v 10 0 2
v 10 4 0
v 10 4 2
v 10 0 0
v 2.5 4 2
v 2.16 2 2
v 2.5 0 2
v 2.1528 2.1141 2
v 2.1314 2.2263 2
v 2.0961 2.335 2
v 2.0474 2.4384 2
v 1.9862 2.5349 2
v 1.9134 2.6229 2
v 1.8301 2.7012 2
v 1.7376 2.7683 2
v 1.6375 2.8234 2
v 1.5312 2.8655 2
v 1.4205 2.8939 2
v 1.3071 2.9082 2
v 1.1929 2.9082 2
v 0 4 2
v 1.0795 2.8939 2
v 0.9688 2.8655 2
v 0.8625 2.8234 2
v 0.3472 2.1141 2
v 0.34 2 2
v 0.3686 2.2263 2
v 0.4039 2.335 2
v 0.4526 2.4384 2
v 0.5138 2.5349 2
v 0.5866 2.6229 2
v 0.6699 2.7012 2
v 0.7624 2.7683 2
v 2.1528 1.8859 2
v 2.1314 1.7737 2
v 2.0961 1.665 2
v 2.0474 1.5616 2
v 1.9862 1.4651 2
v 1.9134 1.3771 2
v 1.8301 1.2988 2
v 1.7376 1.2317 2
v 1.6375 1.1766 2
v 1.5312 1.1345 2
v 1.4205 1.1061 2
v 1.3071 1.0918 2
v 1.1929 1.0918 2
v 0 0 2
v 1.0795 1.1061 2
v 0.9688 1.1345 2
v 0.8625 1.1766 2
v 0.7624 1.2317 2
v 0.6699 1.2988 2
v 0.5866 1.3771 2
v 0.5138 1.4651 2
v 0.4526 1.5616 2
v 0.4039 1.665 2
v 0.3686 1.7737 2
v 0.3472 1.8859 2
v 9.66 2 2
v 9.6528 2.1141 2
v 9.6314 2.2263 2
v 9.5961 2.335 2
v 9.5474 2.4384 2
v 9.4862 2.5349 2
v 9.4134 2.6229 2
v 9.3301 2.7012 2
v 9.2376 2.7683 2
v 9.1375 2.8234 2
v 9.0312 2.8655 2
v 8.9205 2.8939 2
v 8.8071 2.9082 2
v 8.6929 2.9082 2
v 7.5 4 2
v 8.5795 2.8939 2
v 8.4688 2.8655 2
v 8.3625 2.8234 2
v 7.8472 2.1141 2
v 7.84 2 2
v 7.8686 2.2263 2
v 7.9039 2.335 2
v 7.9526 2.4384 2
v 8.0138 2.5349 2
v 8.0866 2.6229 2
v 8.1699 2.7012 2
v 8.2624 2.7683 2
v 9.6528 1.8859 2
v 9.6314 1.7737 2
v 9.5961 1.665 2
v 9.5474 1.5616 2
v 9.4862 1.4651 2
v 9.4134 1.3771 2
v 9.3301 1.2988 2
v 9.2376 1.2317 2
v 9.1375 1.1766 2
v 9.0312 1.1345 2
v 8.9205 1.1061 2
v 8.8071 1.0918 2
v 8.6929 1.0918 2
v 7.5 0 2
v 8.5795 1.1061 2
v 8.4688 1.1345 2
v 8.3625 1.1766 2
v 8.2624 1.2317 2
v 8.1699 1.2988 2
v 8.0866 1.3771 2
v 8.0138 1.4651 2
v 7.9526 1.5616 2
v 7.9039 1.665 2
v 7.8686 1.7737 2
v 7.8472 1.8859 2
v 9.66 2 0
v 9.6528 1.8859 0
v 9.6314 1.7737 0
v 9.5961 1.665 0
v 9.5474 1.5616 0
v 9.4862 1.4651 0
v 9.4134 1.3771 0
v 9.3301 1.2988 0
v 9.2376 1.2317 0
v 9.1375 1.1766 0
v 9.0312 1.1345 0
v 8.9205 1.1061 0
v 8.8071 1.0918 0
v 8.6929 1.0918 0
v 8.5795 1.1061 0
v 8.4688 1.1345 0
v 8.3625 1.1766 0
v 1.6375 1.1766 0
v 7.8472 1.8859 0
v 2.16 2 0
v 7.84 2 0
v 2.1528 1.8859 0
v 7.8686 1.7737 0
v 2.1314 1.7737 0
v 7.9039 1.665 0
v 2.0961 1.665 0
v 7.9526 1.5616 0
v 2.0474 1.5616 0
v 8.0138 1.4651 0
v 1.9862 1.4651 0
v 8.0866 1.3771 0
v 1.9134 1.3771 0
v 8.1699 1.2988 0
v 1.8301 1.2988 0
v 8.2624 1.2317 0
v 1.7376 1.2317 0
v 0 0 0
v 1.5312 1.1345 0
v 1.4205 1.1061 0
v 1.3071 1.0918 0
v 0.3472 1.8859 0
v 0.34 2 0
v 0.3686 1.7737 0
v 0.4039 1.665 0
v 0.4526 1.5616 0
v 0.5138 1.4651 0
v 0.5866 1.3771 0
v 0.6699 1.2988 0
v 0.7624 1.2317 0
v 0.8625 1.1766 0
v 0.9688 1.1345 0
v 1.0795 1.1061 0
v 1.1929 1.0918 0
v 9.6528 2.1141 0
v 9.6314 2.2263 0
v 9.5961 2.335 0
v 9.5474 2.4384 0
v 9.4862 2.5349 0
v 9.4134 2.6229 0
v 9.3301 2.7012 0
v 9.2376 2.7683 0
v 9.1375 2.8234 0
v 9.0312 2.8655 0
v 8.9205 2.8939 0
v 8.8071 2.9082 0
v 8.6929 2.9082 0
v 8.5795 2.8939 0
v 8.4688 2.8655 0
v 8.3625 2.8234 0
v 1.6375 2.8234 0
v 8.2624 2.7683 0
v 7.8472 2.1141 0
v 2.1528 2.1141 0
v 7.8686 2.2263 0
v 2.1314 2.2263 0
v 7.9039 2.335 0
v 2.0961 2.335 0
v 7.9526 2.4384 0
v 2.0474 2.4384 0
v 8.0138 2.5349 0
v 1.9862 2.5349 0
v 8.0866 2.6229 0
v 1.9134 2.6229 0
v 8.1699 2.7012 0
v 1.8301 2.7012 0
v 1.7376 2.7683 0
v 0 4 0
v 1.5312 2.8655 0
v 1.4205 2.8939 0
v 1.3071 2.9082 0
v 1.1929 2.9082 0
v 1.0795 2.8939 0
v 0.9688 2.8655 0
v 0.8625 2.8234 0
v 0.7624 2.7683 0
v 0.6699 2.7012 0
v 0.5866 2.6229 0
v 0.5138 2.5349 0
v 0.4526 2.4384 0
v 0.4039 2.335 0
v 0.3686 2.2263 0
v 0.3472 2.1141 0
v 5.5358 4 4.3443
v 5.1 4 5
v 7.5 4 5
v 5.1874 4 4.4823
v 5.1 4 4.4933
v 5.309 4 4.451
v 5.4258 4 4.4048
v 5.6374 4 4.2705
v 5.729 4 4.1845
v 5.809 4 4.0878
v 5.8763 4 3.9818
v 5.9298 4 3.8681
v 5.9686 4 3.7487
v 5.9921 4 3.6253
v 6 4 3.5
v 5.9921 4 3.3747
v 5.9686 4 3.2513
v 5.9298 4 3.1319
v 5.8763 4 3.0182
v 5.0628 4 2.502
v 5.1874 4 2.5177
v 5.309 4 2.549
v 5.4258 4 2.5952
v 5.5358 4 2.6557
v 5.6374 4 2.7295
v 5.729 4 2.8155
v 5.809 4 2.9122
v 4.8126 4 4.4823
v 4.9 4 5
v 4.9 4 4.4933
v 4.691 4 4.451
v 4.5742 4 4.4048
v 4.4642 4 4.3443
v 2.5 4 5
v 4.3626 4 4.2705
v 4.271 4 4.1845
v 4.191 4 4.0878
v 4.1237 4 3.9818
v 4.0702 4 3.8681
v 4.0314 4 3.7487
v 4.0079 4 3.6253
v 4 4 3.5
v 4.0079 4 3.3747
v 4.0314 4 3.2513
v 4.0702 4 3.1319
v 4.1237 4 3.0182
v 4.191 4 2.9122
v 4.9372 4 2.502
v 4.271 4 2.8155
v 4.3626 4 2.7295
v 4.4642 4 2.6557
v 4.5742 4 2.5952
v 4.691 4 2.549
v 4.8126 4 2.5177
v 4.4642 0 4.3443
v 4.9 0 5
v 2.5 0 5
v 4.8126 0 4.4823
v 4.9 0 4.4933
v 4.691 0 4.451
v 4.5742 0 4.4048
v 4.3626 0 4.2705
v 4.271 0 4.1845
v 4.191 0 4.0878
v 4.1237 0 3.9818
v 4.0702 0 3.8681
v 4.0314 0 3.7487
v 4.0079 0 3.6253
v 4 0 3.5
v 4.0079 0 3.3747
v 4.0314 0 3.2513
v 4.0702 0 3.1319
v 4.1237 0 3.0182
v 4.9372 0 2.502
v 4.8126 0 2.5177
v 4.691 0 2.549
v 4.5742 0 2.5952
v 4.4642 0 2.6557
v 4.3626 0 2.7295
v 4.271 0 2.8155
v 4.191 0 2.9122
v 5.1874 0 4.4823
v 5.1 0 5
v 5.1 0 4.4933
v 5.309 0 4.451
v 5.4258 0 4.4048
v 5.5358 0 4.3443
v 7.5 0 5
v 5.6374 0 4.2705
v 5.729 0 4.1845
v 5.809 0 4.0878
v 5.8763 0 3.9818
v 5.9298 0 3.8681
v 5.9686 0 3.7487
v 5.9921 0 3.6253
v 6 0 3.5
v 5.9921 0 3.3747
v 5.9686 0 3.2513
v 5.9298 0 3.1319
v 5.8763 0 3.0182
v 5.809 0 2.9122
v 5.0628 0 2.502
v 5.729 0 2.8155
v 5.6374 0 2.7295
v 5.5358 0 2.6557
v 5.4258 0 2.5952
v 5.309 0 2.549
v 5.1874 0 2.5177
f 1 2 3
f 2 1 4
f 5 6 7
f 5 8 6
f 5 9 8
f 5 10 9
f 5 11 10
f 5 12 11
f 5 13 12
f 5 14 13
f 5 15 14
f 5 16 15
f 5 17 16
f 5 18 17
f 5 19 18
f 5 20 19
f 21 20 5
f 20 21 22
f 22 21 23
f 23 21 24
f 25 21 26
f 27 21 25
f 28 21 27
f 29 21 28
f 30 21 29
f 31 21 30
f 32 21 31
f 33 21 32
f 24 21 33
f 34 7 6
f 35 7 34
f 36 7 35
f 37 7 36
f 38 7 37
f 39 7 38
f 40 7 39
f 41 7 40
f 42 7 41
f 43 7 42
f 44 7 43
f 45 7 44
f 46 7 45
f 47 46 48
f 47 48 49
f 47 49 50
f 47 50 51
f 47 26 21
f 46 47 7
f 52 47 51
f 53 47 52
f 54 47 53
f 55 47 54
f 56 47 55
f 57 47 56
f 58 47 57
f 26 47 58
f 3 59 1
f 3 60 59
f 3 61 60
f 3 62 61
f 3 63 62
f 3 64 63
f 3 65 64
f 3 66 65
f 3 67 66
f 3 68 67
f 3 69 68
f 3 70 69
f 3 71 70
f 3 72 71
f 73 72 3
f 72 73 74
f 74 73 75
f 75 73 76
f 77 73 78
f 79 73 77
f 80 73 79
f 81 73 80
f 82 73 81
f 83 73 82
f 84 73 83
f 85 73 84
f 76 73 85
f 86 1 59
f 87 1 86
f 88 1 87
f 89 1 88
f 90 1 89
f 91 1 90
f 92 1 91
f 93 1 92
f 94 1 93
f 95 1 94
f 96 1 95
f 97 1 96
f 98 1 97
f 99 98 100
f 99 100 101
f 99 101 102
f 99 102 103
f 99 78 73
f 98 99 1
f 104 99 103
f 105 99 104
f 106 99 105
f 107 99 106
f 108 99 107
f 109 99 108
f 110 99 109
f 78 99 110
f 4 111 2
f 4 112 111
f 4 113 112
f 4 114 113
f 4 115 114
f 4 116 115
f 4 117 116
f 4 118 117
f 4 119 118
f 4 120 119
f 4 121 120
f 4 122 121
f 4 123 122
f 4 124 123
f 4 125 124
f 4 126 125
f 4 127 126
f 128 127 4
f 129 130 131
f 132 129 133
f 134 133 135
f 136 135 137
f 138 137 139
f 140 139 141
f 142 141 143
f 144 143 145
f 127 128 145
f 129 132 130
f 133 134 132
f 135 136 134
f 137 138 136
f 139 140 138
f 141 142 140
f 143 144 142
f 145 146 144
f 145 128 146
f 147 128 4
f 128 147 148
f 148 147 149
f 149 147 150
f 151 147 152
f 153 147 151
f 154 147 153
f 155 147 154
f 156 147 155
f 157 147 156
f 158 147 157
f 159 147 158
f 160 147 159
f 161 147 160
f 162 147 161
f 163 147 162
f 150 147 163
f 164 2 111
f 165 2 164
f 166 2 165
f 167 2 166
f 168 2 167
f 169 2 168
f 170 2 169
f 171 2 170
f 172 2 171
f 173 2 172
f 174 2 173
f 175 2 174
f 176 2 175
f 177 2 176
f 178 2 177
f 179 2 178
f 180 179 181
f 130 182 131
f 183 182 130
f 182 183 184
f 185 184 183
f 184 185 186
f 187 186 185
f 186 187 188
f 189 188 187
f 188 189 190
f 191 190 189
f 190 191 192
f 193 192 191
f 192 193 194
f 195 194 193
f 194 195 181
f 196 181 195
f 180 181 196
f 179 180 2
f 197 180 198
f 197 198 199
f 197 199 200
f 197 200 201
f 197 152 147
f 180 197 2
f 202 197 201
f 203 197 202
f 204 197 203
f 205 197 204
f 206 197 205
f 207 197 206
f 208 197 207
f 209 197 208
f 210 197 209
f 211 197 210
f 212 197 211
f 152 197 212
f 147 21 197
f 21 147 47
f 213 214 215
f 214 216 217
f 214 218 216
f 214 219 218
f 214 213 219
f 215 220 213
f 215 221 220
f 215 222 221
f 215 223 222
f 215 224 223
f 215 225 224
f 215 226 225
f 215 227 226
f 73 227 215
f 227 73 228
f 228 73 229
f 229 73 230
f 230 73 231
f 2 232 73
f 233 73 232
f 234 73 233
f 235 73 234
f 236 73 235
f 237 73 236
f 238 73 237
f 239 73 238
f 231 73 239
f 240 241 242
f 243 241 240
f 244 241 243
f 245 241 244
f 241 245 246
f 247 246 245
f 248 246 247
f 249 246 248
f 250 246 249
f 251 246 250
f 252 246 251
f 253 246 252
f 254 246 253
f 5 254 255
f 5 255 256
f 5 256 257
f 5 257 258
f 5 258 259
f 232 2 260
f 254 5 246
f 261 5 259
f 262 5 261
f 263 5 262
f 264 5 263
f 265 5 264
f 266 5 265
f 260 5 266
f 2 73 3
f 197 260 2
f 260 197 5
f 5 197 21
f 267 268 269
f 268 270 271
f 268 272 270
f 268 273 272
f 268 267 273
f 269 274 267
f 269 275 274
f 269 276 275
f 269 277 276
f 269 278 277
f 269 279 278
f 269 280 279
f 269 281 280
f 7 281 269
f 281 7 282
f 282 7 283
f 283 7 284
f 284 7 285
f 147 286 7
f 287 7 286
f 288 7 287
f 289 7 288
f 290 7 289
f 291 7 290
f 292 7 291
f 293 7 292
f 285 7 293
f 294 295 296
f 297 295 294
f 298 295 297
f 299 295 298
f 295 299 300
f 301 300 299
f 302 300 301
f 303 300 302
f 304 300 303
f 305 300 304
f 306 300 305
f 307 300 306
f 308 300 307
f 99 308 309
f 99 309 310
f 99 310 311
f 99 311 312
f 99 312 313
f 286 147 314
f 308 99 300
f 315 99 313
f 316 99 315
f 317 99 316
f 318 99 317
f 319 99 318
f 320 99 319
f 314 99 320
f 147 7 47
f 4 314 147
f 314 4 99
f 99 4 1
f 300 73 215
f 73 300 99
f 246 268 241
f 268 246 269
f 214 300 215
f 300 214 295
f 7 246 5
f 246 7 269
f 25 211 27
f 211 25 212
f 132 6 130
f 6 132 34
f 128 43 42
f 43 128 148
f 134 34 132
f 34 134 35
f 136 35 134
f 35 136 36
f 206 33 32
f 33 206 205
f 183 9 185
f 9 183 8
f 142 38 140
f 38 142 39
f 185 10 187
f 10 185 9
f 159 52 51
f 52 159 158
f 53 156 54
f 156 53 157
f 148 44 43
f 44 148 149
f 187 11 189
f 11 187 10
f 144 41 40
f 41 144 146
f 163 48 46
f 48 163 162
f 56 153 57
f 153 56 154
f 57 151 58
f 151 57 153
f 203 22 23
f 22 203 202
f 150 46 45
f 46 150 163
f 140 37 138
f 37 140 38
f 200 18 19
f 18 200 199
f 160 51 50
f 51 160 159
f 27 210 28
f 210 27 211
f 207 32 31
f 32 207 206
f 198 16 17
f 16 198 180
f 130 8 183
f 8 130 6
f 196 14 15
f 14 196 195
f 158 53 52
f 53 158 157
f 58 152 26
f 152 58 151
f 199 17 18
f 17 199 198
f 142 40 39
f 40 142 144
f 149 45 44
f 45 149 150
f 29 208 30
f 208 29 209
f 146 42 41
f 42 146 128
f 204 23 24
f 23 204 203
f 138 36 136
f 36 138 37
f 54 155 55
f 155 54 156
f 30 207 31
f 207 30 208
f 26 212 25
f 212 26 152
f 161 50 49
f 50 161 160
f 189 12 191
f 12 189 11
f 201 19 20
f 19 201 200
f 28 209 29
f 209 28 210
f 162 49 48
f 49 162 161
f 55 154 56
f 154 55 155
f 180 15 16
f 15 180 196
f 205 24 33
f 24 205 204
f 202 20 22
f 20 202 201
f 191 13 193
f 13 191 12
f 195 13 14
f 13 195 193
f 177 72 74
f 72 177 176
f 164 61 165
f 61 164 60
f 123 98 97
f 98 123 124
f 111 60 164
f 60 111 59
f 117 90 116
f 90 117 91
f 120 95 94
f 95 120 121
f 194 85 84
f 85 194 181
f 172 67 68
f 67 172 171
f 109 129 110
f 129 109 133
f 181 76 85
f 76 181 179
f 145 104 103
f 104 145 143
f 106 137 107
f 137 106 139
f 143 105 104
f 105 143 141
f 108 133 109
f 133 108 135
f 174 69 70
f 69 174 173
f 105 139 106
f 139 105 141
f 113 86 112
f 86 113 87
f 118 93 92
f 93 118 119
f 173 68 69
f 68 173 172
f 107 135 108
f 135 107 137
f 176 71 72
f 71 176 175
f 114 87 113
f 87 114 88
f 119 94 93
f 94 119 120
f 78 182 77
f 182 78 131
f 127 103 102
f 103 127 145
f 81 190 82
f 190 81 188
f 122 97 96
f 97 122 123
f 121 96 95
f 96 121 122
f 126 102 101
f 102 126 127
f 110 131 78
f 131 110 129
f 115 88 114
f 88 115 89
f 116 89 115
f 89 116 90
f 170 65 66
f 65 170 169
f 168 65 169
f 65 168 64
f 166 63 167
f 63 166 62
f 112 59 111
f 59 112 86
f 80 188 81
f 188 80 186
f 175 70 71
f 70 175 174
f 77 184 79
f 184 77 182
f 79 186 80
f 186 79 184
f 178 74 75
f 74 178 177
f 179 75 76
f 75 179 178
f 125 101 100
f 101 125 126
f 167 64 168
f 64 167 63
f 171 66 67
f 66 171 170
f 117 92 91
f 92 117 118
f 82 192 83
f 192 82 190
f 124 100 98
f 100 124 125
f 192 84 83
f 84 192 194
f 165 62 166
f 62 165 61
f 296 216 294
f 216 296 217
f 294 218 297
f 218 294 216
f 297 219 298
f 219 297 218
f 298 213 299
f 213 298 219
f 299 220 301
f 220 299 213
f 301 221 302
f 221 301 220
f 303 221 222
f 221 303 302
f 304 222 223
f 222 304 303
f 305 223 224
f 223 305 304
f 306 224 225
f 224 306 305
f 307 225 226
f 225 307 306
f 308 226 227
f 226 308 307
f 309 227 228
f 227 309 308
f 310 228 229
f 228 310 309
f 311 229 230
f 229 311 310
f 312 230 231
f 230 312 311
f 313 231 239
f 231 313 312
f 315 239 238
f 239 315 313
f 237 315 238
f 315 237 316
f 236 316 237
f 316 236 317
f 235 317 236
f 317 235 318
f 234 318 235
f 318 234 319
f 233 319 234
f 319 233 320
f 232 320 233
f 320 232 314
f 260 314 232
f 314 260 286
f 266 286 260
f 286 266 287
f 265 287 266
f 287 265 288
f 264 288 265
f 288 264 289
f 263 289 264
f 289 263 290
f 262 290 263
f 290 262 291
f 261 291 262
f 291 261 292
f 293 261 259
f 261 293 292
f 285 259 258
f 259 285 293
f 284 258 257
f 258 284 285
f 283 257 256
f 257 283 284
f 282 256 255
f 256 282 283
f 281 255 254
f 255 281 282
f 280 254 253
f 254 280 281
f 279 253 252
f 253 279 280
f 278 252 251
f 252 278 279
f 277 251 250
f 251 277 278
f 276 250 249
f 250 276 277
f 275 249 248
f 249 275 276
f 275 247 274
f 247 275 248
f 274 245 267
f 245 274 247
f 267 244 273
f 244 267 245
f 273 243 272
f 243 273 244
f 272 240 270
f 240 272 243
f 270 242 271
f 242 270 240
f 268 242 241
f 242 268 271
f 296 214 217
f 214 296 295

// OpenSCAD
$fn=50;
lenght = 10;
lenght2 = 5;
height1 = 2;
height2 = 5;
width = 4;
space = 0.2;

hole_radius = 0.9;
rod_radius =1;

module hole(pos){
	translate([0,0,-0.01]){
		linear_extrude(height = height2){
			translate([pos,width/2,0]){
				circle(r = hole_radius+0.01);
			}
		}
	}
}

difference(){
	union(){
		cube([lenght,width,height1]);
		translate([(lenght-lenght2)/2,0,0]){
			cube([lenght2,width,height2]);
		}
	}
	union(){
		union(){
			hole((lenght-lenght2)/4);
			hole(lenght-(lenght-lenght2)/4);
		}
		translate([lenght/2,-0.01,height2-(height2-height1)/2]){
			rotate([-90,0,0]){
				linear_extrude(height=width+0.02){
					union(){
						circle(r=rod_radius);
						translate([-space/2,-height2,0]){
							square([space,height2]);
						}
					}
				}
			}
		}
	}
}
